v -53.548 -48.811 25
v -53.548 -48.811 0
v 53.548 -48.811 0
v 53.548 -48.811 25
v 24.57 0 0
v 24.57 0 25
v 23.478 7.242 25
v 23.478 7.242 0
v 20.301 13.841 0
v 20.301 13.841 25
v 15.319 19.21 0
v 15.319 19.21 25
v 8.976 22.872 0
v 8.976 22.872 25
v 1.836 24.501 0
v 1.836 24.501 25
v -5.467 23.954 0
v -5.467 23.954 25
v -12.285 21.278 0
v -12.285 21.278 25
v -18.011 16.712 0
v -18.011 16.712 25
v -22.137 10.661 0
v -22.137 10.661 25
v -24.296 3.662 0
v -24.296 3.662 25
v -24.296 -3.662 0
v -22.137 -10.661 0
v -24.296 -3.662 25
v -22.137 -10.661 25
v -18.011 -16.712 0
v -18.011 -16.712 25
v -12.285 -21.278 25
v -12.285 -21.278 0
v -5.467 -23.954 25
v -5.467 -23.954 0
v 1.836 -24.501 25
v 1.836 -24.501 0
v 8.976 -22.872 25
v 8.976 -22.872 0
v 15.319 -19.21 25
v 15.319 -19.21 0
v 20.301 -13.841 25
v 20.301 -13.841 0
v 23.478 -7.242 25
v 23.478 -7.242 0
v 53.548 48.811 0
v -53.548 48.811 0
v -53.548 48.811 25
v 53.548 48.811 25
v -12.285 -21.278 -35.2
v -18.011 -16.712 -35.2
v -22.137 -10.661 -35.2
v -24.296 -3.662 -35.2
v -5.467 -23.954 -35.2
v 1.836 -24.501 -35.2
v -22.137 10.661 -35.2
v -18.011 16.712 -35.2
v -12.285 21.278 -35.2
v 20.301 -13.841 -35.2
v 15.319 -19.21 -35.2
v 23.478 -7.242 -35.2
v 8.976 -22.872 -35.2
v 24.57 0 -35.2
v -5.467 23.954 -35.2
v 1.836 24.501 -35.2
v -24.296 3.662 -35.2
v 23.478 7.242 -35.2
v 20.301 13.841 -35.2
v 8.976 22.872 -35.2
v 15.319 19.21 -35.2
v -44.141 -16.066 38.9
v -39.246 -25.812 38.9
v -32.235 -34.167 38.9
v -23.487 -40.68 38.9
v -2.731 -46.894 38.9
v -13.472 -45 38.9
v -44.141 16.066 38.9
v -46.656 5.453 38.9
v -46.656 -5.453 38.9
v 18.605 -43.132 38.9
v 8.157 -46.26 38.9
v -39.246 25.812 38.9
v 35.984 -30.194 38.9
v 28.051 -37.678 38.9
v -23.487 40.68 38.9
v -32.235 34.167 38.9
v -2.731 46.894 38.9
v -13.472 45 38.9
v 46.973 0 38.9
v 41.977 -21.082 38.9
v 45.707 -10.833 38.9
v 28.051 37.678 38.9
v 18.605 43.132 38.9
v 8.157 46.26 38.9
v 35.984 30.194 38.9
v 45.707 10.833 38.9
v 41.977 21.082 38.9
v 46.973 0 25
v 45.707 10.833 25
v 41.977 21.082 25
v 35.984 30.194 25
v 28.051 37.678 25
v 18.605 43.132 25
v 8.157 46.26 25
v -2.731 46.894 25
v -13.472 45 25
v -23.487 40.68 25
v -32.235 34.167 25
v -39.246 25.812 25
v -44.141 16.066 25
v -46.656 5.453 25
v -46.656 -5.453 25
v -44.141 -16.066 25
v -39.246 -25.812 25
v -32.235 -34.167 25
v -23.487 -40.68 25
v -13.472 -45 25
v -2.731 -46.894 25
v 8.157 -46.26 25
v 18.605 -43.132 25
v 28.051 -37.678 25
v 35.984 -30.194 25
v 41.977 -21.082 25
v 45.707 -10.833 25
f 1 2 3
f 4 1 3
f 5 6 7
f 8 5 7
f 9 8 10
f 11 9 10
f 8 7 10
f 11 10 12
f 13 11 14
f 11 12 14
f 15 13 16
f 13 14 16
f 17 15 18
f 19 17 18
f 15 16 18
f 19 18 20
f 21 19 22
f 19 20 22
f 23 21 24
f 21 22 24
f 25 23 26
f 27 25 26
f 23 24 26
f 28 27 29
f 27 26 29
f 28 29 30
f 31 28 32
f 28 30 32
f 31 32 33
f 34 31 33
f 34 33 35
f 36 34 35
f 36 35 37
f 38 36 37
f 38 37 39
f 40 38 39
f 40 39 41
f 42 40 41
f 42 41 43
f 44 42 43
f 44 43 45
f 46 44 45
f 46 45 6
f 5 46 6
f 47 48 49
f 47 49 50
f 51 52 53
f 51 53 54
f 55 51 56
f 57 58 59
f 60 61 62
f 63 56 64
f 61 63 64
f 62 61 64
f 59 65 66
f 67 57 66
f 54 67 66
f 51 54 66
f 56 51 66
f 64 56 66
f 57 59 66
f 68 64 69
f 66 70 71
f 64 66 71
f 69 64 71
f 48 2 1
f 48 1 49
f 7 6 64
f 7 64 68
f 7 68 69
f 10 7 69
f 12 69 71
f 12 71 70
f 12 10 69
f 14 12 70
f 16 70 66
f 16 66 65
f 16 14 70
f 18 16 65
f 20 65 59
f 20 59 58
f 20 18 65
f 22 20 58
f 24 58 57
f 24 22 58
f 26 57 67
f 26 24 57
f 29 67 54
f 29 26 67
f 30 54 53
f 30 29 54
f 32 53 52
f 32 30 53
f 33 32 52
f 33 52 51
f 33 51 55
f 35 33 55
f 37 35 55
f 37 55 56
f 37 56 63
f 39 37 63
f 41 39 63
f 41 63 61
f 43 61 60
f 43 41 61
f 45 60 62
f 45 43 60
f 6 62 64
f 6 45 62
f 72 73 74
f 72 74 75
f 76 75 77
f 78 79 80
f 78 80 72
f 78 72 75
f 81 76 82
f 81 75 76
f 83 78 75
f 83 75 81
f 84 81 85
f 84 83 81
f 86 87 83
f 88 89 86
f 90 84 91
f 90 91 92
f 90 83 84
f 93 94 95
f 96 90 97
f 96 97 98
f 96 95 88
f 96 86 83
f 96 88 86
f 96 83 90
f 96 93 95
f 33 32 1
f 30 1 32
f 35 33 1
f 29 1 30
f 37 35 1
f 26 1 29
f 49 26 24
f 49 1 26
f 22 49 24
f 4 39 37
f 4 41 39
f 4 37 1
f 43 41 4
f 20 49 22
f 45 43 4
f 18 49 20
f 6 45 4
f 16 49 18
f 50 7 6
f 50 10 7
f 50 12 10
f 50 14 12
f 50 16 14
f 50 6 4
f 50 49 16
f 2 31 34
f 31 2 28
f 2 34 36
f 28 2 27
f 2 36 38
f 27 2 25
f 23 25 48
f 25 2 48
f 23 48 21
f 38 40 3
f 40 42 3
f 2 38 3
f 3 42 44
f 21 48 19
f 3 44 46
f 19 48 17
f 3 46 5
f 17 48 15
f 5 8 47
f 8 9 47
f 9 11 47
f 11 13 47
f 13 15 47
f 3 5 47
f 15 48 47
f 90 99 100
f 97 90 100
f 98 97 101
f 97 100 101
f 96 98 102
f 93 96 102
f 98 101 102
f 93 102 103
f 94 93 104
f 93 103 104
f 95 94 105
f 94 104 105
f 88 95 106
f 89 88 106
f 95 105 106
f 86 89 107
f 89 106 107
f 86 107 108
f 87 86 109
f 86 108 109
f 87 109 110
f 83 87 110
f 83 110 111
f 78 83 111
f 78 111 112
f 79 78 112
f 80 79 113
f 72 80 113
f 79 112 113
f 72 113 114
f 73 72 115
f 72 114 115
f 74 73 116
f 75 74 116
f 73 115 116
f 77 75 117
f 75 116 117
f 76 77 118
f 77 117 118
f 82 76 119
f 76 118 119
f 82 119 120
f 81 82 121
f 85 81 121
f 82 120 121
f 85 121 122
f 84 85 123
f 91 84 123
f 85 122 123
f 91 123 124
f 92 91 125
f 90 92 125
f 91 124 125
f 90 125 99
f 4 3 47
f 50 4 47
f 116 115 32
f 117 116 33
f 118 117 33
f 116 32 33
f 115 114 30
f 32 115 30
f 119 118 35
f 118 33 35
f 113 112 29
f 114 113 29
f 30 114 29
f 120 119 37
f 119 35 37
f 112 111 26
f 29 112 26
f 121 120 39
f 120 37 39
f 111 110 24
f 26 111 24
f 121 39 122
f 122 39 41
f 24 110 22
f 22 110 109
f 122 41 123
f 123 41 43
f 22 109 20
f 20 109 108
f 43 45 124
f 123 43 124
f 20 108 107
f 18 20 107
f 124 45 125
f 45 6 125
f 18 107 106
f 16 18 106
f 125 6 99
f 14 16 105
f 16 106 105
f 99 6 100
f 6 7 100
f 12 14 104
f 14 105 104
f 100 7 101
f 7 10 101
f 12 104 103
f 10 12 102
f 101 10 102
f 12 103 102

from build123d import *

# Parameters (mm, degrees)
F0_W     = 107.0966944098
F0_H     = 97.6227968931
F1_DEPTH = 25
F2_R     = 24.5699498699
F3_DEPTH = 25.001
F4_R     = 24.5699498699
F5_DEPTH = 60.2
F6_R     = 46.9734129042
F7_DEPTH = 13.9


with BuildPart() as f1:
    # F0 (on Top) → F1 (new body)
    with BuildSketch(Plane.XY):
        Rectangle(F0_W, F0_H)
    extrude(amount=F1_DEPTH)

    # F2 (on face) → F3 (cut, through all)
    with BuildSketch(Plane.XY.offset(25)):
        Circle(F2_R)
    extrude(amount=-F3_DEPTH, mode=Mode.SUBTRACT)


with BuildPart() as f5:
    # F4 (on face) → F5 (new body)
    with BuildSketch(Plane.XY.offset(25)):
        Circle(F4_R)
    extrude(amount=-F5_DEPTH)

    # F6 (on face) → F7 (join)
    with BuildSketch(Plane.XY.offset(25)):
        Circle(F6_R)
    extrude(amount=F7_DEPTH)


solid = Compound([f1.part, f5.part])
